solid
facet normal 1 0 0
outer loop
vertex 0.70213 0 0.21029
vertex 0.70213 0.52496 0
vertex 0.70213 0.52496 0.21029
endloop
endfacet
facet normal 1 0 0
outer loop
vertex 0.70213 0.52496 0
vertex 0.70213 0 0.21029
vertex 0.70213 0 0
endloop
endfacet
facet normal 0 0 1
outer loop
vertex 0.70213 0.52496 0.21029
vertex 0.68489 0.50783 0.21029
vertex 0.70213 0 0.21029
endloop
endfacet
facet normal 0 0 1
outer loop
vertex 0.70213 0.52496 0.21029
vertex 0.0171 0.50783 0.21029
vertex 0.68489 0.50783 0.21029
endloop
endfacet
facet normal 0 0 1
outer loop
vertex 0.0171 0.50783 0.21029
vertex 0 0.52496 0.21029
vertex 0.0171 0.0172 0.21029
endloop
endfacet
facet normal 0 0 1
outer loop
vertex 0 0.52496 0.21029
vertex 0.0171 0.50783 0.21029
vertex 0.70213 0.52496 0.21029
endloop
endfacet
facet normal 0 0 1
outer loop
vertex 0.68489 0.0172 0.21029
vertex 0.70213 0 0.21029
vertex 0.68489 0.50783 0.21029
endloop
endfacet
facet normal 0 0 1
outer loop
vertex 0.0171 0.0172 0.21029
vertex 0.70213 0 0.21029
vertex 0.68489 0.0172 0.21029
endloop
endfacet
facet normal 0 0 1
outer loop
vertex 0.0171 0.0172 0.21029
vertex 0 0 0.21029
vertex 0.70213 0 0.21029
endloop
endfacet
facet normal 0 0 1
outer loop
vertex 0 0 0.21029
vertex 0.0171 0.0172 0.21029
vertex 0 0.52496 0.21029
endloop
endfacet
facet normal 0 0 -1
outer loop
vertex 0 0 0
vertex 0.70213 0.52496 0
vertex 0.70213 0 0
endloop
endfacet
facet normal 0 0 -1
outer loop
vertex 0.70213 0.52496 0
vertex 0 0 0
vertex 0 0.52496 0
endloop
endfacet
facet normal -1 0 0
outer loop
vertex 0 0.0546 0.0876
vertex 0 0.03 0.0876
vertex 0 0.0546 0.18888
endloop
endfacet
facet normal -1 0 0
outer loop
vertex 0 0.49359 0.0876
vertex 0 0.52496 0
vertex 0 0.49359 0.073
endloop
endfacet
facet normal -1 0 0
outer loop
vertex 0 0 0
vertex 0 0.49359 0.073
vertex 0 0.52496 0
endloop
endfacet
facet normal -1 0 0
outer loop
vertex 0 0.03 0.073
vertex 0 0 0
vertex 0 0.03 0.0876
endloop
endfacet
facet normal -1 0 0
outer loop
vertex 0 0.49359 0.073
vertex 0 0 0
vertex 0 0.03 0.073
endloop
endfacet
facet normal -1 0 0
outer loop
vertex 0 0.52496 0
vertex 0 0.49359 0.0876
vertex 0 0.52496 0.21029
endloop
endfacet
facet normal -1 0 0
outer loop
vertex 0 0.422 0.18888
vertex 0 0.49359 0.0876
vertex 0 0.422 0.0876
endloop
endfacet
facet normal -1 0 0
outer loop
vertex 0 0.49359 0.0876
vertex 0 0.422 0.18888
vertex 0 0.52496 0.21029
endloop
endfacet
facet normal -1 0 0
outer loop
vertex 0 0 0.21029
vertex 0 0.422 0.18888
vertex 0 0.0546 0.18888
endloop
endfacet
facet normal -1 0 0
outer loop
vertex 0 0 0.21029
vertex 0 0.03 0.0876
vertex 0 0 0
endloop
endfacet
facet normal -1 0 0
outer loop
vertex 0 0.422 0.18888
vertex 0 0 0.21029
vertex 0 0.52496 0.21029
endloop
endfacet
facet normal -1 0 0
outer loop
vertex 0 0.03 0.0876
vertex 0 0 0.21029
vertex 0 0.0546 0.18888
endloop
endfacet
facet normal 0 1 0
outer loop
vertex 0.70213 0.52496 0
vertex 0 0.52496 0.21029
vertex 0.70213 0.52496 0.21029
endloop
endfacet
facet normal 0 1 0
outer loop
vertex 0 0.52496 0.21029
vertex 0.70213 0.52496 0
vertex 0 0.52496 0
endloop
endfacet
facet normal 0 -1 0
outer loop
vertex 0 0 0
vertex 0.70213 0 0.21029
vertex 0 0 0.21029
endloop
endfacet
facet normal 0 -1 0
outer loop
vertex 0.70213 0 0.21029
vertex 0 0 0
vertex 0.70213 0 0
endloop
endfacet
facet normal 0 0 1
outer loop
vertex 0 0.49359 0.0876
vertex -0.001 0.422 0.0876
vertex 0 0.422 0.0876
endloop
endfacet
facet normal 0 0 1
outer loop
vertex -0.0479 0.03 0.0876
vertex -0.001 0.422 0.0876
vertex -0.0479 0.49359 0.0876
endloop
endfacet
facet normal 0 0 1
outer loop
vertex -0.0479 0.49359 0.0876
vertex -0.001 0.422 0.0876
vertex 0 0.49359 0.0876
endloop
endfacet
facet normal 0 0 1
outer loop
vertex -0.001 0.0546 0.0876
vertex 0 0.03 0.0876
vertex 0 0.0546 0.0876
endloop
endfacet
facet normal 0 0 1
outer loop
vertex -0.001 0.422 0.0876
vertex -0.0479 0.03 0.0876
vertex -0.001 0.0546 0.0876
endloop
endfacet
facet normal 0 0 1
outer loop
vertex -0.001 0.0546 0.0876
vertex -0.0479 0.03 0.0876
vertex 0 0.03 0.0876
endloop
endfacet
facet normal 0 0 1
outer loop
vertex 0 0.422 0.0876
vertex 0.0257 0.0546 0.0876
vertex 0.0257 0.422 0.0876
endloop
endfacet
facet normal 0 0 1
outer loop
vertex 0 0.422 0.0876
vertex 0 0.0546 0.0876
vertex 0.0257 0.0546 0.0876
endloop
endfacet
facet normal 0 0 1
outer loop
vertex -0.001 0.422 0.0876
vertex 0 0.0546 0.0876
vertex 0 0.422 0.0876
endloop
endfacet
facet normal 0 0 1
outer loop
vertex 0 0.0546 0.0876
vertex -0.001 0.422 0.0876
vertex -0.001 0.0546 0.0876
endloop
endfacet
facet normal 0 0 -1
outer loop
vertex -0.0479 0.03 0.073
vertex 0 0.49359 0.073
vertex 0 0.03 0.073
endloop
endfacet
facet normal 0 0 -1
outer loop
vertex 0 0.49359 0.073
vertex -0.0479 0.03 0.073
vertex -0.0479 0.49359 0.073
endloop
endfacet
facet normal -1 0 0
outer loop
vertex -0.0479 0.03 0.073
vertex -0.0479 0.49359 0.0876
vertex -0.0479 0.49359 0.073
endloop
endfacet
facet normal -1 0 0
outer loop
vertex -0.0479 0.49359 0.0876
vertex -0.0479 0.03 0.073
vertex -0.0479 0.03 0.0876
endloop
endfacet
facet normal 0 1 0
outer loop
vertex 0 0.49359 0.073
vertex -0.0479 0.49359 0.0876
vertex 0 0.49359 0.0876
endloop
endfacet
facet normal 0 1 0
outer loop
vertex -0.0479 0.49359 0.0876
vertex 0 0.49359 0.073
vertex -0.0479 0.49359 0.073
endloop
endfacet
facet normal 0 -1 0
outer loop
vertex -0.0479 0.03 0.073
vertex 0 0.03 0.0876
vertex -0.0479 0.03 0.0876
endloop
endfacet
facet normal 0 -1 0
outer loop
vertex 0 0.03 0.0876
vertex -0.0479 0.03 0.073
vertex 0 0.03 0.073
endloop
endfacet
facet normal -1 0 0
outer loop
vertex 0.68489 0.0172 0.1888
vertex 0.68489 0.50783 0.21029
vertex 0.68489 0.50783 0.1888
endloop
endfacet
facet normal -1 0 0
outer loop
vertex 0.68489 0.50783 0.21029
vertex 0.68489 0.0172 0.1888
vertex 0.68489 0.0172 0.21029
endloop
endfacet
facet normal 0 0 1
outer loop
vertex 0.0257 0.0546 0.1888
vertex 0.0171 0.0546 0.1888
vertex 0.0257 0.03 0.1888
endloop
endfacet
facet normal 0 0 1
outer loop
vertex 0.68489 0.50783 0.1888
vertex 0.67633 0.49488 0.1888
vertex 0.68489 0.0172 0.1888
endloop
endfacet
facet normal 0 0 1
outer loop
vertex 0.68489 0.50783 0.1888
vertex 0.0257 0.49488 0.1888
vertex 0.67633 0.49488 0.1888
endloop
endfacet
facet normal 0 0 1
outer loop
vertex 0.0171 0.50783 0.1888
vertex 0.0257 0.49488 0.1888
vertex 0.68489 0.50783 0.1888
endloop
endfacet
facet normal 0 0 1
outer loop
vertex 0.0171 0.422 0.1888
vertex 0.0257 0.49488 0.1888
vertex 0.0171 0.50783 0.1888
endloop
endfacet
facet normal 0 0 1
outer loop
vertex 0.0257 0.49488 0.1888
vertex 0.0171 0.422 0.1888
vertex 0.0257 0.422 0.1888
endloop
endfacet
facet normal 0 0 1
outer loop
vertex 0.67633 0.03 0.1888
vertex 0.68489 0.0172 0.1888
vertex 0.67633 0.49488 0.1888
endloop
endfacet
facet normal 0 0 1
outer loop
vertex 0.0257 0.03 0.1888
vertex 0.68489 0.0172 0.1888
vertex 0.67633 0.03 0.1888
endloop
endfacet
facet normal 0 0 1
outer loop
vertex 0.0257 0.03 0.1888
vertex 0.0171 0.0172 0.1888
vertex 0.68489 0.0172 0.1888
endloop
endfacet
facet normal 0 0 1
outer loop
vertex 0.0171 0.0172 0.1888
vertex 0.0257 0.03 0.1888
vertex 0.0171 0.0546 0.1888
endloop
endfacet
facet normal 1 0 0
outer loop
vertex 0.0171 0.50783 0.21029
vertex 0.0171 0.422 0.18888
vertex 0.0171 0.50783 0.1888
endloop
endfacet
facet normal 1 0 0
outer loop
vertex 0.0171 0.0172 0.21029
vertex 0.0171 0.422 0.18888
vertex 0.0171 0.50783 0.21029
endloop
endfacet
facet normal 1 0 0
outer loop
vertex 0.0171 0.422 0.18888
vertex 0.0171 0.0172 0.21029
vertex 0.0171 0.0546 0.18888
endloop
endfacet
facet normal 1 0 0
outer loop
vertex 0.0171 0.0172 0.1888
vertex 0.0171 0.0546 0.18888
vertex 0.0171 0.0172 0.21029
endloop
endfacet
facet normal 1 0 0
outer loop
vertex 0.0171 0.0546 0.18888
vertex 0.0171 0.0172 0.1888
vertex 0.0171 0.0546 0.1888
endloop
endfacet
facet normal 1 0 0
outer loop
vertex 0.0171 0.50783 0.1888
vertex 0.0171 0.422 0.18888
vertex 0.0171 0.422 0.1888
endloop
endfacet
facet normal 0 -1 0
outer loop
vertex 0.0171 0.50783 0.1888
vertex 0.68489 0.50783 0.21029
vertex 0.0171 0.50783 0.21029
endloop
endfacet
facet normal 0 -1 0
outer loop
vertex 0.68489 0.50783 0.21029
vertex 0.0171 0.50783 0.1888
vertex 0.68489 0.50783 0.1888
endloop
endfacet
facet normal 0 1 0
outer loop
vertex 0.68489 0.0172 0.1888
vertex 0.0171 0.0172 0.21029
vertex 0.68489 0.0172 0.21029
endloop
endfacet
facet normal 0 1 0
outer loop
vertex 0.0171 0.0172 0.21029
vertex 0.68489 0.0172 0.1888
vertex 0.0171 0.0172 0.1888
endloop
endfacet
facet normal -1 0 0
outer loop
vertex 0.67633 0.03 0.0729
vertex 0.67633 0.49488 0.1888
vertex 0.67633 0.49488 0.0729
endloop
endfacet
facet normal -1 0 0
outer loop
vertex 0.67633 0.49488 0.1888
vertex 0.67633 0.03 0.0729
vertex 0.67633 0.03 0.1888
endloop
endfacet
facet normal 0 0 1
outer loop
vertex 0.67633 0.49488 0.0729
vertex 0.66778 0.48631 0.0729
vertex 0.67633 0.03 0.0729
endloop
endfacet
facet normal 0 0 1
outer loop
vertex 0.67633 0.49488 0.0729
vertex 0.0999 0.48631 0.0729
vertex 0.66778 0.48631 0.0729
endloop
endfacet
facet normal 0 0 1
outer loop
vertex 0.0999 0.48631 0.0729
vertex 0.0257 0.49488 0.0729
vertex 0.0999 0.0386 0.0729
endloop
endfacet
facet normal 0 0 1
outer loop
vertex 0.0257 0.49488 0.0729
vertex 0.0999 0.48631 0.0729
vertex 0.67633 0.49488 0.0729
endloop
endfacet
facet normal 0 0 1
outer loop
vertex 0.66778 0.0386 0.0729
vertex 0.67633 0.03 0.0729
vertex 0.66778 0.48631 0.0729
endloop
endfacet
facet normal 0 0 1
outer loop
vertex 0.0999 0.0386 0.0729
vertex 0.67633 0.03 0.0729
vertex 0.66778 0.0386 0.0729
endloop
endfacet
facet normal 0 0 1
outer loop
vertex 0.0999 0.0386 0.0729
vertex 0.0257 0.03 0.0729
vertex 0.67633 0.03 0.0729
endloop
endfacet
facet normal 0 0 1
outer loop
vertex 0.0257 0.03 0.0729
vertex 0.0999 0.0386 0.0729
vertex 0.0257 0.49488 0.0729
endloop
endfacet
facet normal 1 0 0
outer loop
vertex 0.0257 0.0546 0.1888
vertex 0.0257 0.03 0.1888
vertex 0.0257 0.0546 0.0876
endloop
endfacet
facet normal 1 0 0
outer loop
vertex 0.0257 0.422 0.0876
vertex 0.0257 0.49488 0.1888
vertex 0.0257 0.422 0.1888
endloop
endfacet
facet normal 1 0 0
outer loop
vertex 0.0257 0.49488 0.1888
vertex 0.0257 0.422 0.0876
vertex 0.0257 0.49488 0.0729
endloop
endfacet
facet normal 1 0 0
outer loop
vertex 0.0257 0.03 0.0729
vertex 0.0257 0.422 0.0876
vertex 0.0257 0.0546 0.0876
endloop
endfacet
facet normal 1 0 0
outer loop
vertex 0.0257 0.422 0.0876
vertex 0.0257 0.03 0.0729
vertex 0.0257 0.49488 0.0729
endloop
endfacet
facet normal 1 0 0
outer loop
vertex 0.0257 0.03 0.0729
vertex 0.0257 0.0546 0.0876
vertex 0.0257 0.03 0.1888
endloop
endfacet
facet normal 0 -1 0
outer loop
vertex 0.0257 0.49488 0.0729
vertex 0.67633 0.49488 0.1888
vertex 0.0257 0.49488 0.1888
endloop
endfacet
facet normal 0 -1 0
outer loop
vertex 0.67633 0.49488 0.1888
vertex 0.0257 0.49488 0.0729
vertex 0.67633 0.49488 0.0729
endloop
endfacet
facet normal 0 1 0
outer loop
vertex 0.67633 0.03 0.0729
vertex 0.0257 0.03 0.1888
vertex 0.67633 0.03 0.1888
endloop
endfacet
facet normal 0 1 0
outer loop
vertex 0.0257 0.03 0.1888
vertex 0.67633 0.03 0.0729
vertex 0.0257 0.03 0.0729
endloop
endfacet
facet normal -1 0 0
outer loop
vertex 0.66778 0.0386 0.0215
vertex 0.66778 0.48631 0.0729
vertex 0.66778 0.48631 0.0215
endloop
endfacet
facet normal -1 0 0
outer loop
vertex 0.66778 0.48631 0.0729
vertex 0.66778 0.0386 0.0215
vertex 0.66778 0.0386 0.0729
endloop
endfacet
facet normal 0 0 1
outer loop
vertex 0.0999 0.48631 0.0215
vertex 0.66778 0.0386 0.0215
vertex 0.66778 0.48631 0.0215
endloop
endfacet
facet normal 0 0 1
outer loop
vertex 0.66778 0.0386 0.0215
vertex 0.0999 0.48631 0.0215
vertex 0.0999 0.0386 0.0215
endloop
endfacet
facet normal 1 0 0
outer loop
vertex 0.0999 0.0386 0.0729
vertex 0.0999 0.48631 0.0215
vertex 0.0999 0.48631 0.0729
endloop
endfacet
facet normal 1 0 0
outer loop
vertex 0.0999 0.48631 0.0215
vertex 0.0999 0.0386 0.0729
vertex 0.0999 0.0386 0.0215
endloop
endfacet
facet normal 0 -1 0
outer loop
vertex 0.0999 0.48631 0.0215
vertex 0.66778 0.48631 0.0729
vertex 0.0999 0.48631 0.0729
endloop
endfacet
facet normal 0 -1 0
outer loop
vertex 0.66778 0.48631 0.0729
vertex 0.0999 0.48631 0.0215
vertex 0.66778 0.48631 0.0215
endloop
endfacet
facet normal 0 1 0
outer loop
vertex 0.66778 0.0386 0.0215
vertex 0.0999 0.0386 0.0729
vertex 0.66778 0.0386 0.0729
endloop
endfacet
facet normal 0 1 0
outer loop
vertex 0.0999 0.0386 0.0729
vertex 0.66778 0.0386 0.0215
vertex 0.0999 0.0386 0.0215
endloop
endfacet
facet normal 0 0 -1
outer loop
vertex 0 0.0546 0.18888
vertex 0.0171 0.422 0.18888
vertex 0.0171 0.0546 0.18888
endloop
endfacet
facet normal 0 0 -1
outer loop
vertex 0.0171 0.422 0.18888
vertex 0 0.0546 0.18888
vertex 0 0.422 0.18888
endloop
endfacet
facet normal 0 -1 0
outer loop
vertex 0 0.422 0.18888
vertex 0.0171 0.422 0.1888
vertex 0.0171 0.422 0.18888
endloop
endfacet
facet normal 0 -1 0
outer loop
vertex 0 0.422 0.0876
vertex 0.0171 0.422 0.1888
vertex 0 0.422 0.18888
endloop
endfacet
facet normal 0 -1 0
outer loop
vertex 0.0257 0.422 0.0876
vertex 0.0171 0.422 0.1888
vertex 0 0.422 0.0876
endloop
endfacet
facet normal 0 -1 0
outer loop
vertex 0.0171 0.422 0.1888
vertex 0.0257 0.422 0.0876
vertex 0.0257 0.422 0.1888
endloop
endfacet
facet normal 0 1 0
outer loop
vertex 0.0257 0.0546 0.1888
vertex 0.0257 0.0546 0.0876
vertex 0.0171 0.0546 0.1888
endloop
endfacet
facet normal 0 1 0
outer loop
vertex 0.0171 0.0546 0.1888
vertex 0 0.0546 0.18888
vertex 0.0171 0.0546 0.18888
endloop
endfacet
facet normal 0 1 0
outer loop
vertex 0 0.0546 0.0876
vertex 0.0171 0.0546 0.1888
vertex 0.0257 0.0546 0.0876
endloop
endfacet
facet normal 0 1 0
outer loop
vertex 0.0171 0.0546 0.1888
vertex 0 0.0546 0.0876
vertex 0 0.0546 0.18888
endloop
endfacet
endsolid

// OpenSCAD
// ---------------- Parameters ----------------
// Main reference body
L = 0.702127;     // length  (X)
W = 0.524964;     // width   (Y)
H = 0.210295;     // height  (Z)

// Top rectangular recess (open at the top face)
r1_x = 0.0171;    r1_y = 0.0172;    r1_z = 0.1888;
r1_dx = 0.667793; r1_dy = 0.490631;

// Second contained cut below the top recess
r2_x = 0.0257;    r2_y = 0.0300;    r2_z = 0.0729;
r2_dx = 0.650626; r2_dy = 0.464880;

// Lower offset pocket (non-through, bottom thickness 0.0215)
r3_x = 0.0999;    r3_y = 0.0386;    r3_z = 0.0215;
r3_dx = 0.567882; r3_dy = 0.447713; r3_dz = 0.0515;

// Solid side projection overhanging the left length edge
p_x = -0.0479;    p_y = 0.0300;     p_z = 0.0730;
p_dx = 0.130618;  p_dy = 0.463588;  p_dz = 0.0146;

// Side recess cut into the left edge
s_x = 0.0000;     s_y = 0.0546;     s_z = 0.0876;
s_dx = 0.0343;    s_dy = 0.367400;  s_dz = 0.101285;

eps = 0.001;      // overshoot to guarantee clean boolean cuts
$fn = 64;

// ---------------- Model ----------------
difference() {
    // Body plus the added solid side projection
    union() {
        cube([L, W, H]);
        translate([p_x, p_y, p_z])
            cube([p_dx, p_dy, p_dz]);
    }

    // 1) Shallow top recess (overshoot above the top face)
    translate([r1_x, r1_y, r1_z])
        cube([r1_dx, r1_dy, H - r1_z + eps]);

    // 2) Contained continuation cut down to the lower band
    translate([r2_x, r2_y, r2_z])
        cube([r2_dx, r2_dy, r1_z - r2_z + eps]);

    // 3) Lower offset rectangular pocket
    translate([r3_x, r3_y, r3_z])
        cube([r3_dx, r3_dy, r3_dz + eps]);

    // 4) Side recess from the left edge (overshoot past the edge)
    translate([s_x - eps, s_y, s_z])
        cube([s_dx + eps, s_dy, s_dz]);
}
